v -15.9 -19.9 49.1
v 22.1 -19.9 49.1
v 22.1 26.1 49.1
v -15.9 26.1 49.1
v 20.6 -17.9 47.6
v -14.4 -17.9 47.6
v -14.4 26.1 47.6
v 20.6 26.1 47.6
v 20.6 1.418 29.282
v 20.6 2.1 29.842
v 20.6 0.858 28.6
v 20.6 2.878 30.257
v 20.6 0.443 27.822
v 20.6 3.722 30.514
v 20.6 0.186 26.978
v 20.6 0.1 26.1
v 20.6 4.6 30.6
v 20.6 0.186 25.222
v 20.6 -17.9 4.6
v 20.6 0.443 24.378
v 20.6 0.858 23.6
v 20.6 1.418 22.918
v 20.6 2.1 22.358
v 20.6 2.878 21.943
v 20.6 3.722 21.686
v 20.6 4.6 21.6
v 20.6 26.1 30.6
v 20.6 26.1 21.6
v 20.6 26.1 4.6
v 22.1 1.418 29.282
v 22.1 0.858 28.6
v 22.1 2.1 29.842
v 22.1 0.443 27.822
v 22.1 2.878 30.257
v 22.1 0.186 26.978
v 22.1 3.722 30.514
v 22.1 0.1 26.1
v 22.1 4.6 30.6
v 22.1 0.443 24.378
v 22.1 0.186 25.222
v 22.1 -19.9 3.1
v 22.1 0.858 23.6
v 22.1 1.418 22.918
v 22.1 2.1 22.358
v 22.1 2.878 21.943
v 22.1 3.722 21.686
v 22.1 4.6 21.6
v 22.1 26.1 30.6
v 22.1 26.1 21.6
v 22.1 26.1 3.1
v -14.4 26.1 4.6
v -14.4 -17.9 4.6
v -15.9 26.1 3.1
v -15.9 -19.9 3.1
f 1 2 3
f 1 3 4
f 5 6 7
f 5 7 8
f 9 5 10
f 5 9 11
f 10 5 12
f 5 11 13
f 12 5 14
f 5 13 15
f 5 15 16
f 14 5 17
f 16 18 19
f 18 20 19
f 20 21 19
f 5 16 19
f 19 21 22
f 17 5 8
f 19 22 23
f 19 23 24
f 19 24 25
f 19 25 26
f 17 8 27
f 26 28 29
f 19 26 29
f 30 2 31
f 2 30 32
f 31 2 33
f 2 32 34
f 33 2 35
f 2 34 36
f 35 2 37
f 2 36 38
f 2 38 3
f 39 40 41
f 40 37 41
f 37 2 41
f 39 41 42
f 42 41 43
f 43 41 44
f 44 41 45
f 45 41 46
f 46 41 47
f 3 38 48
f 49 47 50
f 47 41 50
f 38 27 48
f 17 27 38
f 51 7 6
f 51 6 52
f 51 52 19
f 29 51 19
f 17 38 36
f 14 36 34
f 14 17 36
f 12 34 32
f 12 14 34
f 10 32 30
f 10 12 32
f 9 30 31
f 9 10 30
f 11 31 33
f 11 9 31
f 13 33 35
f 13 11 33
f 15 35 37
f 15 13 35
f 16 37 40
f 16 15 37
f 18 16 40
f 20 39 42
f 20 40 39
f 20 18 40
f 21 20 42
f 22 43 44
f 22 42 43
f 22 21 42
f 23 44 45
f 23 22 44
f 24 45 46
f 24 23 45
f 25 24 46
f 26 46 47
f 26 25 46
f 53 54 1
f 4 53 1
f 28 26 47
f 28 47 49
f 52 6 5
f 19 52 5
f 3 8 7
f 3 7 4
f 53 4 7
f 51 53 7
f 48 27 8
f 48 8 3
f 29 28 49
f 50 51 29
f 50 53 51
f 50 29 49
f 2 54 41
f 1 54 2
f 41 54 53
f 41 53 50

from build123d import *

# Parameters (mm, degrees)
ESQUISSE1_W                   = 44.2
ESQUISSE1_H                   = 52.2
BOSS_EXTRU_1_DEPTH            = 52.2
ENL_V_MAT_EXTRU_2_DEPTH       = 74.209903702
ENL_V_MAT_EXTRU_2_DEPTH_BACK  = 44.2
ENL_V_MAT_EXTRU_3_DEPTH       = 74.209903702
ENL_V_MAT_EXTRU_3_DEPTH_BACK  = 44.2
ENL_V_MAT_EXTRU_4_DEPTH       = 78.059003368
ENL_V_MAT_EXTRU_4_DEPTH_BACK  = 46
ENL_V_MAT_EXTRU_5_DEPTH       = 78.059003368
ENL_V_MAT_EXTRU_5_DEPTH_BACK  = 46
ENL_V_MAT_EXTRU_7_DEPTH       = 45.550224466
ENL_V_MAT_EXTRU_7_DEPTH_BACK  = 45.550224466
ENL_V_MAT_EXTRU_8_DEPTH       = 78.059003368
ENL_V_MAT_EXTRU_8_DEPTH_BACK  = 46
ENL_V_MAT_EXTRU_9_DEPTH       = 75.993733072
ENL_V_MAT_EXTRU_9_DEPTH_BACK  = 46
ESQUISSE13_W                  = 35
ESQUISSE13_H                  = 43
ENL_V_MAT_EXTRU_10_DEPTH      = 44
ENL_V_MAT_EXTRU_11_DEPTH      = 72.032809321
ENL_V_MAT_EXTRU_11_DEPTH_BACK = 1.5
ENL_V_MAT_EXTRU_13_DEPTH      = 72.032809321
ENL_V_MAT_EXTRU_13_DEPTH_BACK = 38
ENL_V_MAT_EXTRU_15_DEPTH      = 71.818217995
ENL_V_MAT_EXTRU_15_DEPTH_BACK = 46


with BuildPart() as part:
    # Esquisse1 → Boss.-Extru.1 (new body)
    with BuildSketch(Plane.XY):
        Rectangle(ESQUISSE1_W, ESQUISSE1_H)
    extrude(amount=BOSS_EXTRU_1_DEPTH)

    # Esquisse2 → Enlèv. mat.-Extru.2 (cut, two sides: drawn at the far end of the back side and taken through both)
    with BuildSketch(Plane(origin=(22.1, 0, 0), x_dir=(0, 0, -1), z_dir=(1, 0, 0)).offset(-ENL_V_MAT_EXTRU_2_DEPTH_BACK)):
        Polygon((-201.352290675, -19.9), (-52.2, -19.9), (-28.55, -19.9), (-28.55, -21.45), (-32.25, -21.45), (-32.25, -22.45), (-28.745559959, -26.1), (74.553898465, -133.690091099), (-39.180744024, -409.461834307), (-315.086933163, -295.671743208), align=None)
    extrude(amount=ENL_V_MAT_EXTRU_2_DEPTH + ENL_V_MAT_EXTRU_2_DEPTH_BACK, mode=Mode.SUBTRACT)

    # Esquisse3 → Enlèv. mat.-Extru.3 (cut, two sides: drawn at the far end of the back side and taken through both)
    with BuildSketch(Plane(origin=(22.1, 0, 0), x_dir=(0, 0, -1), z_dir=(1, 0, 0)).offset(-ENL_V_MAT_EXTRU_3_DEPTH_BACK)):
        Polygon((149.152290675, -19.9), (0, -19.9), (-23.65, -19.9), (-23.65, -21.45), (-19.95, -21.45), (-19.95, -22.45), (-23.454440041, -26.1), (-126.753898465, -133.690091099), (-13.019255976, -409.461834307), (262.886933163, -295.671743208), align=None)
    extrude(amount=ENL_V_MAT_EXTRU_3_DEPTH + ENL_V_MAT_EXTRU_3_DEPTH_BACK, mode=Mode.SUBTRACT)

    # Esquisse4 → Enlèv. mat.-Extru.4 (cut, two sides: drawn at the far end of the back side and taken through both)
    with BuildSketch(Plane(origin=(0, 26.1, 0), x_dir=(1, 0, 0), z_dir=(0, 1, 0)).offset(-ENL_V_MAT_EXTRU_4_DEPTH_BACK)):
        Polygon((-15.9, -191.333109619), (-15.9, -52.2), (-15.9, -28.55), (-17.45, -28.55), (-17.45, -32.25), (-18.45, -32.25), (-22.1, -28.745559959), (-122.462816227, 67.614843274), (-379.791464965, -38.281593439), (-273.228648738, -297.229546332), align=None)
    extrude(amount=ENL_V_MAT_EXTRU_4_DEPTH + ENL_V_MAT_EXTRU_4_DEPTH_BACK, mode=Mode.SUBTRACT)

    # Esquisse5 → Enlèv. mat.-Extru.5 (cut, two sides: drawn at the far end of the back side and taken through both)
    with BuildSketch(Plane(origin=(0, 26.1, 0), x_dir=(1, 0, 0), z_dir=(0, 1, 0)).offset(-ENL_V_MAT_EXTRU_5_DEPTH_BACK)):
        Polygon((-15.9, 139.133109619), (-15.9, 0), (-15.9, -23.65), (-17.45, -23.65), (-17.45, -19.95), (-18.45, -19.95), (-22.1, -23.454440041), (-122.462816228, -119.814843274), (-379.791464965, -13.918406561), (-273.228648738, 245.029546332), align=None)
    extrude(amount=ENL_V_MAT_EXTRU_5_DEPTH + ENL_V_MAT_EXTRU_5_DEPTH_BACK, mode=Mode.SUBTRACT)

    # Esquisse6 → Enlèv. mat.-Extru.7 (cut, two sides: drawn at the far end of the back side and taken through both)
    with BuildSketch(Plane.XY.offset(28.55).offset(-ENL_V_MAT_EXTRU_7_DEPTH_BACK)):
        Polygon((-161.22284167, -19.9), (-22.1, -19.9), (-15.9, -19.9), (-15.9, -26.093649616), (-15.9, -165.216491285), (-212.645110561, -361.97019968), (-357.967952231, -216.653708395), align=None)
    extrude(amount=ENL_V_MAT_EXTRU_7_DEPTH + ENL_V_MAT_EXTRU_7_DEPTH_BACK, mode=Mode.SUBTRACT)

    # Esquisse11 → Enlèv. mat.-Extru.8 (cut, two sides: drawn at the far end of the back side and taken through both)
    with BuildSketch(Plane(origin=(0, 26.1, 0), x_dir=(1, 0, 0), z_dir=(0, 1, 0)).offset(-ENL_V_MAT_EXTRU_8_DEPTH_BACK)):
        Polygon((164.227968273, -49.1), (22.1, -49.1), (-15.9, -49.1), (-158.027968273, -49.1), (-158.027968273, -333.355936546), (164.227968273, -333.355936546), align=None)
    extrude(amount=ENL_V_MAT_EXTRU_8_DEPTH + ENL_V_MAT_EXTRU_8_DEPTH_BACK, mode=Mode.SUBTRACT)

    # Esquisse12 → Enlèv. mat.-Extru.9 (cut, two sides: drawn at the far end of the back side and taken through both)
    with BuildSketch(Plane(origin=(0, 26.1, 0), x_dir=(1, 0, 0), z_dir=(0, 1, 0)).offset(-ENL_V_MAT_EXTRU_9_DEPTH_BACK)):
        Polygon((159.687460199, -3.1), (22.1, -3.1), (-15.9, -3.1), (-153.487460199, -3.1), (-153.487460199, 272.074920398), (159.687460199, 272.074920398), align=None)
    extrude(amount=ENL_V_MAT_EXTRU_9_DEPTH + ENL_V_MAT_EXTRU_9_DEPTH_BACK, mode=Mode.SUBTRACT)

    # Esquisse13 → Enlèv. mat.-Extru.10 (cut)
    with BuildSketch(Plane(origin=(0, 26.1, 0), x_dir=(1, 0, 0), z_dir=(0, 1, 0))):
        with Locations((3.1, -26.1)):
            Rectangle(ESQUISSE13_W, ESQUISSE13_H)
    extrude(amount=-ENL_V_MAT_EXTRU_10_DEPTH, mode=Mode.SUBTRACT)

    # Esquisse14 → Enlèv. mat.-Extru.11 (cut, two sides: drawn at the far end of the back side and taken through both)
    with BuildSketch(Plane(origin=(22.1, 0, 0), x_dir=(0, 0, -1), z_dir=(1, 0, 0)).offset(-ENL_V_MAT_EXTRU_11_DEPTH_BACK)):
        with BuildLine():
            Line((-21.6, 4.6), (-21.6, 26.1))
            Line((-21.6, 26.1), (-30.6, 26.1))
            Line((-30.6, 26.1), (-30.6, 4.6))
            ThreePointArc((-30.6, 4.6), (-26.1, 0.1), (-21.6, 4.6))
        make_face()
    extrude(amount=ENL_V_MAT_EXTRU_11_DEPTH + ENL_V_MAT_EXTRU_11_DEPTH_BACK, mode=Mode.SUBTRACT)

    # Esquisse15 → Enlèv. mat.-Extru.13 (cut, two sides: drawn at the far end of the back side and taken through both)
    with BuildSketch(Plane(origin=(22.1, 0, 0), x_dir=(0, 0, -1), z_dir=(1, 0, 0)).offset(-ENL_V_MAT_EXTRU_13_DEPTH_BACK)):
        Polygon((-143.691856556, -19.9), (-28.55, -19.9), (-23.65, -19.9), (91.491856556, -19.9), (91.491856556, -250.183713112), (-143.691856556, -250.183713112), align=None)
    extrude(amount=ENL_V_MAT_EXTRU_13_DEPTH + ENL_V_MAT_EXTRU_13_DEPTH_BACK, mode=Mode.SUBTRACT)

    # Esquisse16 → Enlèv. mat.-Extru.15 (cut, two sides: drawn at the far end of the back side and taken through both)
    with BuildSketch(Plane(origin=(0, -19.9, 0), x_dir=(-1, 0, 0), z_dir=(0, -1, 0)).offset(-ENL_V_MAT_EXTRU_15_DEPTH_BACK)):
        Polygon((15.9, -130.020268394), (15.9, -28.55), (15.9, -23.65), (15.9, 77.820268394), (218.840536787, 77.820268394), (218.840536787, -130.020268394), align=None)
    extrude(amount=ENL_V_MAT_EXTRU_15_DEPTH + ENL_V_MAT_EXTRU_15_DEPTH_BACK, mode=Mode.SUBTRACT)


solid = part.part
